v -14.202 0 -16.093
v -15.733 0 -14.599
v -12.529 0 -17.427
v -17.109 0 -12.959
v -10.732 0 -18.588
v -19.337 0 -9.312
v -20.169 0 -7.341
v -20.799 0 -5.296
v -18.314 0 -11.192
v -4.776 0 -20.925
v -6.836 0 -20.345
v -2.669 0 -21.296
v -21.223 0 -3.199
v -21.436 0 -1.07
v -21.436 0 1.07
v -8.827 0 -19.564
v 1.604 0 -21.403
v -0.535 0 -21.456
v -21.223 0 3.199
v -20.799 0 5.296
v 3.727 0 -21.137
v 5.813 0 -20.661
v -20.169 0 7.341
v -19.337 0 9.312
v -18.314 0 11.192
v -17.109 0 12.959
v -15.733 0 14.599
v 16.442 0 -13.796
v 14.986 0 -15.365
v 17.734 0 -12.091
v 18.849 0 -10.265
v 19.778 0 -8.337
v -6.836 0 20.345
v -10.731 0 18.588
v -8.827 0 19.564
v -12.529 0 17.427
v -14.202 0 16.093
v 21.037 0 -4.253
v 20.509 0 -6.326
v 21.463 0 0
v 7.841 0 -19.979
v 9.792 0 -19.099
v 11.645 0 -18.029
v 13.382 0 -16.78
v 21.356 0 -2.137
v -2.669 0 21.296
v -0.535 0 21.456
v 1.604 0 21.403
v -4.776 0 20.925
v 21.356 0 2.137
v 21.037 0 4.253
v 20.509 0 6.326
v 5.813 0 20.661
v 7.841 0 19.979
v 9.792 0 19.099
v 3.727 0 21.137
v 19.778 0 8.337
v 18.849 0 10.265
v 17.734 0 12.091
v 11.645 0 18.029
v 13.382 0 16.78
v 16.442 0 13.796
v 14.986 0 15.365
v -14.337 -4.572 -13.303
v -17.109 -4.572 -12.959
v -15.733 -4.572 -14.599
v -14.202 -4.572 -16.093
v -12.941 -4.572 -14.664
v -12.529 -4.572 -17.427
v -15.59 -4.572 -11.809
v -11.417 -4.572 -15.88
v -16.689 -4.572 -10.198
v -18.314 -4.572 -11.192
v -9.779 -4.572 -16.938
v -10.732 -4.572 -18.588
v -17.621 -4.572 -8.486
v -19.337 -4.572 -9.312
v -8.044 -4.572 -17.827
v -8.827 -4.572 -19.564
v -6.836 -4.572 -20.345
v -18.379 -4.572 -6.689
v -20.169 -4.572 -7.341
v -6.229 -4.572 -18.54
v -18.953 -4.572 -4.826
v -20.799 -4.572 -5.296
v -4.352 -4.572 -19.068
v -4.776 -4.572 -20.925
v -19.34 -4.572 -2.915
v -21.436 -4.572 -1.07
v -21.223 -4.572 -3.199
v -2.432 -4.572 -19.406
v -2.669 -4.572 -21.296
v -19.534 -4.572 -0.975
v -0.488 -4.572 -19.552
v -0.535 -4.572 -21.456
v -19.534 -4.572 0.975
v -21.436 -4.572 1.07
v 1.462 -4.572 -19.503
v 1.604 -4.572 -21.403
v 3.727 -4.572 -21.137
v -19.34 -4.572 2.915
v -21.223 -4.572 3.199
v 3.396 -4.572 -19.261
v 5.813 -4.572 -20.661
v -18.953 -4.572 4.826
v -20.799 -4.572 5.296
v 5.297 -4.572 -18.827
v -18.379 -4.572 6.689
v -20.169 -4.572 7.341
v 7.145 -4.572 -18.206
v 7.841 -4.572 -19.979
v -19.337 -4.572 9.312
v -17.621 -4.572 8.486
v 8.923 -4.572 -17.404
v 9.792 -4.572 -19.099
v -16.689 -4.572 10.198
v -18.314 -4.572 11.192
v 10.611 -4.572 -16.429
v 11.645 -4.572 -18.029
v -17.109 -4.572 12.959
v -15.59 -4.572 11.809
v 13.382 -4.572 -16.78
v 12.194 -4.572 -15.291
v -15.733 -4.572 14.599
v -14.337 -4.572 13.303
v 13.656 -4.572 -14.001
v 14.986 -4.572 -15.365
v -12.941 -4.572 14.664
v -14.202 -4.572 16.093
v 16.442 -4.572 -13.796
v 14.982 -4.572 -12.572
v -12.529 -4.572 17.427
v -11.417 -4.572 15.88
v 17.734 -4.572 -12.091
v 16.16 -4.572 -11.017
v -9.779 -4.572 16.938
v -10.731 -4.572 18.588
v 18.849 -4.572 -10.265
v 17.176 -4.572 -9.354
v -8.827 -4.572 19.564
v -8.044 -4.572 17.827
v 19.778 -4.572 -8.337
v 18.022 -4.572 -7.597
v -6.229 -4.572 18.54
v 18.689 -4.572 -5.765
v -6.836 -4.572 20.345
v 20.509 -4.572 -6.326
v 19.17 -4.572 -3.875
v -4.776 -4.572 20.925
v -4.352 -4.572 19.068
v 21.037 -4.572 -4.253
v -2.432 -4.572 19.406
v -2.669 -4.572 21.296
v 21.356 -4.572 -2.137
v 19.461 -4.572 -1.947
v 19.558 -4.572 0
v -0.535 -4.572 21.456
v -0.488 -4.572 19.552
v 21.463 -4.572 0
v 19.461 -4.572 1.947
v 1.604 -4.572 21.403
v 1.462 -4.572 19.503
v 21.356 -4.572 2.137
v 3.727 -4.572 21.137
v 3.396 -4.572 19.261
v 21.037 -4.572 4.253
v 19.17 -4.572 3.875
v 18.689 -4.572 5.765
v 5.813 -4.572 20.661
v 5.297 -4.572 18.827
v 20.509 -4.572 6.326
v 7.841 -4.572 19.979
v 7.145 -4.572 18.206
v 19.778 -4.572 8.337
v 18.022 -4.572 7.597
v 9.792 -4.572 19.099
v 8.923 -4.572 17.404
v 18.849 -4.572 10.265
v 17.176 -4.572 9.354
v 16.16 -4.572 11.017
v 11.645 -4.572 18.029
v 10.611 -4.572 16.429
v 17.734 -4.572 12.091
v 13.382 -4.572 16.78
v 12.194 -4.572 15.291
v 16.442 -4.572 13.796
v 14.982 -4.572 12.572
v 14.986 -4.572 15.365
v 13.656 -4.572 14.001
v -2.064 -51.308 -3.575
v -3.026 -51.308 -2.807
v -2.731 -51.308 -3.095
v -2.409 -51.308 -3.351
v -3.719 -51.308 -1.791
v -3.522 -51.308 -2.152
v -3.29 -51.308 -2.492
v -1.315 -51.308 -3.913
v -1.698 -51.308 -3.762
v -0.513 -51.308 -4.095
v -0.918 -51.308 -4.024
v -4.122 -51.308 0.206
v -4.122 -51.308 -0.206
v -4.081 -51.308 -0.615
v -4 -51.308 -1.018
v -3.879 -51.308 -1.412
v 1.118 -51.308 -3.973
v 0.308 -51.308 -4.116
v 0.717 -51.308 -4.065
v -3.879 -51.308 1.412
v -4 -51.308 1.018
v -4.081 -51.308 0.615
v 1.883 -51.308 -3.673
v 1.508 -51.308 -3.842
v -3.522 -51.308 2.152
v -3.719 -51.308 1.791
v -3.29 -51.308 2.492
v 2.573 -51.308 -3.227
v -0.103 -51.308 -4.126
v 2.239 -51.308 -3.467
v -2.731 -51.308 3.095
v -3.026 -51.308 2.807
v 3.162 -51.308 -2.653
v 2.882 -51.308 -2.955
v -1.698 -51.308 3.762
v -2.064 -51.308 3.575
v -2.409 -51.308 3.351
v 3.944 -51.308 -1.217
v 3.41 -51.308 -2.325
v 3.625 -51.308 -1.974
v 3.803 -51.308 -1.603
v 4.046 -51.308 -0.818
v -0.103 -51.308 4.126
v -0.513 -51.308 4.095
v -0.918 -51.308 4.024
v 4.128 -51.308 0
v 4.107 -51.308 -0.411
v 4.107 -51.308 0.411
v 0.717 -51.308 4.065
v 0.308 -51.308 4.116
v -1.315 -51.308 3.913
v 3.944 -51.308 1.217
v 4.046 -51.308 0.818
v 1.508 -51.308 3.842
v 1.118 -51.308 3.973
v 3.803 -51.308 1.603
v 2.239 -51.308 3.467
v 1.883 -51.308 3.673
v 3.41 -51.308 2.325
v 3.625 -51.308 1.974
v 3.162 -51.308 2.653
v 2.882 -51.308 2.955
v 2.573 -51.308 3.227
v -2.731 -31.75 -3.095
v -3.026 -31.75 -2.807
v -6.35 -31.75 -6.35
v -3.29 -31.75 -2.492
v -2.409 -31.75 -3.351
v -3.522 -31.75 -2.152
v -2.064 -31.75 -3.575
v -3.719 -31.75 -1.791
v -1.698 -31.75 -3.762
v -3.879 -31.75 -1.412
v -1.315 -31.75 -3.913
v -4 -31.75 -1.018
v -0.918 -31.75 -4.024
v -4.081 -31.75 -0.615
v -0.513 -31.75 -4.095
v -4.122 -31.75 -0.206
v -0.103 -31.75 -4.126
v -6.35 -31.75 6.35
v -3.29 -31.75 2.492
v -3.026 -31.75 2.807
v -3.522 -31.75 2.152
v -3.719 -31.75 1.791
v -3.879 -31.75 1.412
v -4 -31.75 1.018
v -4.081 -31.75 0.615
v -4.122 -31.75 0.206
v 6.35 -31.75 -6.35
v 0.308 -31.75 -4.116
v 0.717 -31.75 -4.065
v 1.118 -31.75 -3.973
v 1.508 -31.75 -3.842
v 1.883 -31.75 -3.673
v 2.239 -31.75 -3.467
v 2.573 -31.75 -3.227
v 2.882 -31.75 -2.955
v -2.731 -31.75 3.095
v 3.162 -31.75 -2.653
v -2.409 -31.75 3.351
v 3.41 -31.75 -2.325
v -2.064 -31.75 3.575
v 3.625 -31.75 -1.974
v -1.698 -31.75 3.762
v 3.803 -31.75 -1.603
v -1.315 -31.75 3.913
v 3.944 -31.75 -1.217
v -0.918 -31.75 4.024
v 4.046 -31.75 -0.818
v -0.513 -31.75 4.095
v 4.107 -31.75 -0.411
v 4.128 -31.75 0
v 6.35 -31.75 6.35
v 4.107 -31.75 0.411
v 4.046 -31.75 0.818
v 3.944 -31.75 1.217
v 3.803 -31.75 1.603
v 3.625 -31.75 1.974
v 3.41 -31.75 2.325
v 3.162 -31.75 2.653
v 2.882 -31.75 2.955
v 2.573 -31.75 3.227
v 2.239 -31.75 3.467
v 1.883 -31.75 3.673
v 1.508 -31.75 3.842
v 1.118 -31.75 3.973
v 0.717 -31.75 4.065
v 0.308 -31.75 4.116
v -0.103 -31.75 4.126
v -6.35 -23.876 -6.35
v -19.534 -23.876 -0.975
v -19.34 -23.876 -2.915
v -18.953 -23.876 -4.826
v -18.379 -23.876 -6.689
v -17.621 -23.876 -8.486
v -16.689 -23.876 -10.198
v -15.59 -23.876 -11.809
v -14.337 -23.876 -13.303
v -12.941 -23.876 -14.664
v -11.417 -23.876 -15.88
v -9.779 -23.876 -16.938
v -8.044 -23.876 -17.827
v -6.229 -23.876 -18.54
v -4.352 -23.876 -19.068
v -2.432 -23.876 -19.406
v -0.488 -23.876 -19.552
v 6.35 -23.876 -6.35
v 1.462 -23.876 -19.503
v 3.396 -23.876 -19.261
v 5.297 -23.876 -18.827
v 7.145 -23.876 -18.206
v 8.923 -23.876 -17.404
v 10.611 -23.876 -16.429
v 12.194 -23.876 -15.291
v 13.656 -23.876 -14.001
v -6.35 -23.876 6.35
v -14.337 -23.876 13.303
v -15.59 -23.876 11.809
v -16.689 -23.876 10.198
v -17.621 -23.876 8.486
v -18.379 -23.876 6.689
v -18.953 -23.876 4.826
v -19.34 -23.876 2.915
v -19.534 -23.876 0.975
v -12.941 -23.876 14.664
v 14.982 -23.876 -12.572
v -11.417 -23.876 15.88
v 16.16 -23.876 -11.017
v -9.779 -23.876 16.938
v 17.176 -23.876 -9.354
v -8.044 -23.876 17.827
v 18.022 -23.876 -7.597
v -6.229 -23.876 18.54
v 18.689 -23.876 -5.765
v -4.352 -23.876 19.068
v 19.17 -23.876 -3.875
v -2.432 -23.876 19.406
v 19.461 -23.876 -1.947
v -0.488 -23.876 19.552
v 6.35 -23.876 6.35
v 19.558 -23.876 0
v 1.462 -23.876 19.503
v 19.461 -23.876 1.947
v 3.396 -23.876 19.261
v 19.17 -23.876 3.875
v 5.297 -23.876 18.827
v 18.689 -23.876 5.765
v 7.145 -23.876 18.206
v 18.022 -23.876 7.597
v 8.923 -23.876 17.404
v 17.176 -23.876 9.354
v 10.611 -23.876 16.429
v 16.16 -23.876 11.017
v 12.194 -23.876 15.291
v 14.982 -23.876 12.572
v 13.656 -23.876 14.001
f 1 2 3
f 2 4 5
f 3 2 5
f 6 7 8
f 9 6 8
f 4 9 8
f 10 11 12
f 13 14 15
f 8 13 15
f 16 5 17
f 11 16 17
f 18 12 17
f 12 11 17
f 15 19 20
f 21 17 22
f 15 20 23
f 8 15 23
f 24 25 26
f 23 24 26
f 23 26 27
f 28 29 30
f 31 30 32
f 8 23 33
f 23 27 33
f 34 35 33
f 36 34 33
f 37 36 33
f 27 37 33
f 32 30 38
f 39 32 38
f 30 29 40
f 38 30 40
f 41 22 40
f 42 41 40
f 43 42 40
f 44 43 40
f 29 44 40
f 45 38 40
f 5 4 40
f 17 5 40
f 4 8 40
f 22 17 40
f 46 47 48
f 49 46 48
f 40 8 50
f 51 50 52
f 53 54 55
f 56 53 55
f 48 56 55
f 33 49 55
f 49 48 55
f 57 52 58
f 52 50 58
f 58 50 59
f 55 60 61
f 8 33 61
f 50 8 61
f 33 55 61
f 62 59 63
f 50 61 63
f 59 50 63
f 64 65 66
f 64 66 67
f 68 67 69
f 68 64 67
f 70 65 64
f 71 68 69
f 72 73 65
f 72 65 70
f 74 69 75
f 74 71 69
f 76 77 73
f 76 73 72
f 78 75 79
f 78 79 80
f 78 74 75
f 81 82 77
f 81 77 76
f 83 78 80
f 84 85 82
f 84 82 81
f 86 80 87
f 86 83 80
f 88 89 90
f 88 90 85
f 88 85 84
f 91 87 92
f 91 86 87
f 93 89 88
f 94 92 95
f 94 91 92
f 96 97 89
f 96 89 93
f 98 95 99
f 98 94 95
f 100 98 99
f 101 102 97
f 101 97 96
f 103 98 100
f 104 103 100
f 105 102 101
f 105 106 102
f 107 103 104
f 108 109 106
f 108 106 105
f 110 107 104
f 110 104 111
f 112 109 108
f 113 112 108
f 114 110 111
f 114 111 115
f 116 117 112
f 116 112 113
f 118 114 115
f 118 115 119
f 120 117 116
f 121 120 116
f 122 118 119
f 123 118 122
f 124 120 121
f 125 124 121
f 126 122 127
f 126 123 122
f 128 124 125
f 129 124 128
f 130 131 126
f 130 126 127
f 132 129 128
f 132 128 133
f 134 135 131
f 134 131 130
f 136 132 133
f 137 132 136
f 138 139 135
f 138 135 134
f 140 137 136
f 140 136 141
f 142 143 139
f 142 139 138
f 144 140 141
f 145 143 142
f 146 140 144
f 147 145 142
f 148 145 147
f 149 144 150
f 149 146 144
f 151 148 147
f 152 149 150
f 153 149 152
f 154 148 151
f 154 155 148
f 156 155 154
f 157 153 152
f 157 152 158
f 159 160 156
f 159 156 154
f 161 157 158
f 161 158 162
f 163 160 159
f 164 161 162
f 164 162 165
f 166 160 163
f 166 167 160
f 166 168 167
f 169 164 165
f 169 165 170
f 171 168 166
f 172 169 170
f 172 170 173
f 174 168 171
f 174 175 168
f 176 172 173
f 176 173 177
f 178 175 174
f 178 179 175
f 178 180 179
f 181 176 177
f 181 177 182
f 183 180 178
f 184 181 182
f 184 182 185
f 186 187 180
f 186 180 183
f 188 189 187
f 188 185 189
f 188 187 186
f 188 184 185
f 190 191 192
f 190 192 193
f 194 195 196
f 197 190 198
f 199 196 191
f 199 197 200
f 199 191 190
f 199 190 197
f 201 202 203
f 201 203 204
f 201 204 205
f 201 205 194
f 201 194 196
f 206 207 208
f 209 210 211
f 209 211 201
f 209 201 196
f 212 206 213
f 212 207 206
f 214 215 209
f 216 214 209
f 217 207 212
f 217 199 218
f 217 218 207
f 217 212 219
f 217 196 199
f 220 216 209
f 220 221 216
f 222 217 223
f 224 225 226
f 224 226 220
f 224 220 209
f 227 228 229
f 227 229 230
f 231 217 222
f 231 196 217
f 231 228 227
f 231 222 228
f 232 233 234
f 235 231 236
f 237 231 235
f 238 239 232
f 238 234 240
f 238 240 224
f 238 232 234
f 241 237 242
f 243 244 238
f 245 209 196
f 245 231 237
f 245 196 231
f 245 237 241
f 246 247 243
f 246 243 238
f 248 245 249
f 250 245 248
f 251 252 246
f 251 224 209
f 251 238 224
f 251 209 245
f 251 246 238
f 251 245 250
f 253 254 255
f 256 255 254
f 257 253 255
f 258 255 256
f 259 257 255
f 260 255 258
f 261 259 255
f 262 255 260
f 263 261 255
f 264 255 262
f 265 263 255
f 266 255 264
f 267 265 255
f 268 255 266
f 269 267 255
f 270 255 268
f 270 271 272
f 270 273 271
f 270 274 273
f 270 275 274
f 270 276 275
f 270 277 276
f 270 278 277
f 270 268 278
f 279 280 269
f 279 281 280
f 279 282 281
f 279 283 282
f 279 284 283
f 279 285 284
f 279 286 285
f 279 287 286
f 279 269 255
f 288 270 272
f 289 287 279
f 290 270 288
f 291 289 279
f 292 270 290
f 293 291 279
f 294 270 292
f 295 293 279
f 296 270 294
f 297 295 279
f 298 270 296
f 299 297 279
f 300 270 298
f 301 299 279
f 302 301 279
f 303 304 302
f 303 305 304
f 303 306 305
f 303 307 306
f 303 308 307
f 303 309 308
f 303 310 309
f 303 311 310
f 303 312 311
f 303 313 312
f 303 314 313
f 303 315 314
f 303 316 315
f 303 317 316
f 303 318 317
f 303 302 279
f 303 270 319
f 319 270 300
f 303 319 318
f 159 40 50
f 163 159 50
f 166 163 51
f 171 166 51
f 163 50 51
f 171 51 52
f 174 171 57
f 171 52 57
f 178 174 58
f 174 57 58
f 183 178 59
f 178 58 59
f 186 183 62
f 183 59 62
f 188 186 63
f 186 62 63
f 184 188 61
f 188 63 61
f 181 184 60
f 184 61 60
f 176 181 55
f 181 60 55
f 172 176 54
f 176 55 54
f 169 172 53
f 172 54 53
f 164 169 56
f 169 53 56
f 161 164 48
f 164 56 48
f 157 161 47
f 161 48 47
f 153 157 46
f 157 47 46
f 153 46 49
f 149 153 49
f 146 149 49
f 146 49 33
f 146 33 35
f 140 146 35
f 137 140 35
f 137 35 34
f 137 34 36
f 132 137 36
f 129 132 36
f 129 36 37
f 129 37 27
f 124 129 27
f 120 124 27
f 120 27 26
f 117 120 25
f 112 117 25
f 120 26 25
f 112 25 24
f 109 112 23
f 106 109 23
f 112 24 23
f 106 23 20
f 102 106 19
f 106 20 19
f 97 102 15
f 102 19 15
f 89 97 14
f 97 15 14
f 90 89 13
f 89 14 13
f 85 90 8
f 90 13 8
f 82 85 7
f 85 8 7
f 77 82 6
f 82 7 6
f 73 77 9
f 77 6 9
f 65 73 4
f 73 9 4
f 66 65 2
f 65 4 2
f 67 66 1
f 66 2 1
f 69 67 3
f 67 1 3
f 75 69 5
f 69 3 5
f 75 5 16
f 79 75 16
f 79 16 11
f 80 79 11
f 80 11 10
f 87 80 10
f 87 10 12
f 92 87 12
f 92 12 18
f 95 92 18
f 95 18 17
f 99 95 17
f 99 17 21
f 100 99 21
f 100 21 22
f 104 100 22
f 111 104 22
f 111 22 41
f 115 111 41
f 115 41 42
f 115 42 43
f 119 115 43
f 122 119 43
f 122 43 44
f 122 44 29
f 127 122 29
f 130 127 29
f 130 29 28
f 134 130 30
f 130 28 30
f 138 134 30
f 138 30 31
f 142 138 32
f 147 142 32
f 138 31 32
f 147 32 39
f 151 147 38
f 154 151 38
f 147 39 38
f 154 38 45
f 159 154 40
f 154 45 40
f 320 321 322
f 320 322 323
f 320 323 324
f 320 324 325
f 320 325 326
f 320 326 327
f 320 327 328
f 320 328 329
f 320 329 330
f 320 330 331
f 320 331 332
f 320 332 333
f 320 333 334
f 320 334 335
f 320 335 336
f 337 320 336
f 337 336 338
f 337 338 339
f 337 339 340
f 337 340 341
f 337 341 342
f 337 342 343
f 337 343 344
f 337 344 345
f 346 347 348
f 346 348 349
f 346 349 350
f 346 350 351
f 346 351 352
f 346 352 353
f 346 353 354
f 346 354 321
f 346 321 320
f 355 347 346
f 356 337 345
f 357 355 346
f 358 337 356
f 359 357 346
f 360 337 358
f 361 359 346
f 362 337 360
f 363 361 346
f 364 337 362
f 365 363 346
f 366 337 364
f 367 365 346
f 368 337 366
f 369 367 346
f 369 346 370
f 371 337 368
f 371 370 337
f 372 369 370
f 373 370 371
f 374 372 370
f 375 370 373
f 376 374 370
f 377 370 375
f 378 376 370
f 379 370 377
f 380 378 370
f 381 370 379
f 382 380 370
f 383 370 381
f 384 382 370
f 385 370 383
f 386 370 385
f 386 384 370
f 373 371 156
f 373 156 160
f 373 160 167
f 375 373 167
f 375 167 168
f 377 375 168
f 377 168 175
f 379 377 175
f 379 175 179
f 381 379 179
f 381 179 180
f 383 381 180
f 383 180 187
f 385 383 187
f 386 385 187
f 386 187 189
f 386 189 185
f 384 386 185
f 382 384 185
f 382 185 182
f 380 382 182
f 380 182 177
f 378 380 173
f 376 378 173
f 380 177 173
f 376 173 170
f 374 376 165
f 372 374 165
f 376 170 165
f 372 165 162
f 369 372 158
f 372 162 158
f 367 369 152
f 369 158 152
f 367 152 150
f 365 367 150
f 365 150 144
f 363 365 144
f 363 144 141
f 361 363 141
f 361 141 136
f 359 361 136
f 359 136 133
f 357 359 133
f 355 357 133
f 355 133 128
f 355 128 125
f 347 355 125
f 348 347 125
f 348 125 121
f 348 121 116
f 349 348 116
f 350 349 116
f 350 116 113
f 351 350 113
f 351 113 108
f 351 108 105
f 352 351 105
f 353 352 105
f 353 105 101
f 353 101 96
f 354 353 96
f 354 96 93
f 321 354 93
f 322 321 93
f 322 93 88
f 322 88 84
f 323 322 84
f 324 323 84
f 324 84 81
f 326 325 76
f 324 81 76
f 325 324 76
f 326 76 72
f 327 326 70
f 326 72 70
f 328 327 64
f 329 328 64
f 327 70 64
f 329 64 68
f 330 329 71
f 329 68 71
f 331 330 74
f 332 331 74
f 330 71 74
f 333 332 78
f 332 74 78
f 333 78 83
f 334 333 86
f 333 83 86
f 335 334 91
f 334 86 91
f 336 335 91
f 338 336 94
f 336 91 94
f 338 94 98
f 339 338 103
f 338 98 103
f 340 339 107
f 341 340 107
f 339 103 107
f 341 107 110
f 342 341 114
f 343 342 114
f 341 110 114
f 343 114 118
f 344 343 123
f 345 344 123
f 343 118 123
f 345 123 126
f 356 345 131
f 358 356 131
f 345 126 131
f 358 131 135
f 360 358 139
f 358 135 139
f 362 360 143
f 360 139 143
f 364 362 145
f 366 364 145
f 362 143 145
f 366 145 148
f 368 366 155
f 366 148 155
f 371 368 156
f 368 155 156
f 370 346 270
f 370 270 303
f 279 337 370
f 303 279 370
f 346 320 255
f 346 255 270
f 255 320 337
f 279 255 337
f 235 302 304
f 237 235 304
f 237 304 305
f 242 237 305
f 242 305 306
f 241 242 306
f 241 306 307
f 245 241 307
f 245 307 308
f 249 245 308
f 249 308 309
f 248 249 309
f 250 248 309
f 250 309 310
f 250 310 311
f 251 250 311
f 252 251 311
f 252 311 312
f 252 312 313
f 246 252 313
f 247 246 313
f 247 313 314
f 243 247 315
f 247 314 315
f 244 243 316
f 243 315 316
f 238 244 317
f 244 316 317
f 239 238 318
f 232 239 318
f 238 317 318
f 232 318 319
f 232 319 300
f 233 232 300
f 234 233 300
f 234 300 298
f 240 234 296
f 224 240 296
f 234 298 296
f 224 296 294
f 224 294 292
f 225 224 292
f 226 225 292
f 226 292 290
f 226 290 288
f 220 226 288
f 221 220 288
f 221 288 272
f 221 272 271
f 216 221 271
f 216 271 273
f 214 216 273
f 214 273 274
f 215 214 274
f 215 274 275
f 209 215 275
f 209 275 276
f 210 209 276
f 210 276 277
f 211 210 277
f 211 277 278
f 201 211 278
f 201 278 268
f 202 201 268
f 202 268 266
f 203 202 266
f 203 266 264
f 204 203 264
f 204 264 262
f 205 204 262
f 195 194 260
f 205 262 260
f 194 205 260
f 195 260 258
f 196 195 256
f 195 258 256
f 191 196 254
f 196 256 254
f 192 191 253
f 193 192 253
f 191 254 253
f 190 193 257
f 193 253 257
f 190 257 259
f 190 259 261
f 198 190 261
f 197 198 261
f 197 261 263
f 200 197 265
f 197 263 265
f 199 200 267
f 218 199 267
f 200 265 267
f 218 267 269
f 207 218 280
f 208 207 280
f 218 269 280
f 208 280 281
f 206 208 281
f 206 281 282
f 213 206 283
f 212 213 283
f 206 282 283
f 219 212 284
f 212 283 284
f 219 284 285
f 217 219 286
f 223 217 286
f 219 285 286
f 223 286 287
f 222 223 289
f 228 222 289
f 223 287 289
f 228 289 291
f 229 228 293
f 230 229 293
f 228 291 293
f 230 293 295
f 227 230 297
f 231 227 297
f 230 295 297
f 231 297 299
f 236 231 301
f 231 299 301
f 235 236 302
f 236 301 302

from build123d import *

# Parameters (mm, degrees)
F0_R     = 21.463
F0_R_2   = 19.558
F1_DEPTH = 4.572
F0_W     = 12.7
F0_H     = 12.7
F2_DEPTH = 23.876
F0_R_3   = 4.1275
F3_DEPTH = 31.75
F4_DEPTH = 51.308


with BuildPart() as f1:
    # F0 (on Front) → F1 (new body)
    with BuildSketch(Plane.XZ):
        Circle(F0_R)
        Circle(F0_R_2, mode=Mode.SUBTRACT)
    extrude(amount=F1_DEPTH)

    # F0 (on Front) → F2 (join)
    with BuildSketch(Plane.XZ):
        Circle(F0_R_2)
        Rectangle(F0_W, F0_H, mode=Mode.SUBTRACT)
    extrude(amount=F2_DEPTH)

    # F0 (on Front) → F3 (join)
    with BuildSketch(Plane.XZ):
        Rectangle(F0_W, F0_H)
        Circle(F0_R_3, mode=Mode.SUBTRACT)
    extrude(amount=F3_DEPTH)

    # F0 (on Front) → F4 (join)
    with BuildSketch(Plane.XZ):
        Circle(F0_R_3)
    extrude(amount=F4_DEPTH)


solid = f1.part
